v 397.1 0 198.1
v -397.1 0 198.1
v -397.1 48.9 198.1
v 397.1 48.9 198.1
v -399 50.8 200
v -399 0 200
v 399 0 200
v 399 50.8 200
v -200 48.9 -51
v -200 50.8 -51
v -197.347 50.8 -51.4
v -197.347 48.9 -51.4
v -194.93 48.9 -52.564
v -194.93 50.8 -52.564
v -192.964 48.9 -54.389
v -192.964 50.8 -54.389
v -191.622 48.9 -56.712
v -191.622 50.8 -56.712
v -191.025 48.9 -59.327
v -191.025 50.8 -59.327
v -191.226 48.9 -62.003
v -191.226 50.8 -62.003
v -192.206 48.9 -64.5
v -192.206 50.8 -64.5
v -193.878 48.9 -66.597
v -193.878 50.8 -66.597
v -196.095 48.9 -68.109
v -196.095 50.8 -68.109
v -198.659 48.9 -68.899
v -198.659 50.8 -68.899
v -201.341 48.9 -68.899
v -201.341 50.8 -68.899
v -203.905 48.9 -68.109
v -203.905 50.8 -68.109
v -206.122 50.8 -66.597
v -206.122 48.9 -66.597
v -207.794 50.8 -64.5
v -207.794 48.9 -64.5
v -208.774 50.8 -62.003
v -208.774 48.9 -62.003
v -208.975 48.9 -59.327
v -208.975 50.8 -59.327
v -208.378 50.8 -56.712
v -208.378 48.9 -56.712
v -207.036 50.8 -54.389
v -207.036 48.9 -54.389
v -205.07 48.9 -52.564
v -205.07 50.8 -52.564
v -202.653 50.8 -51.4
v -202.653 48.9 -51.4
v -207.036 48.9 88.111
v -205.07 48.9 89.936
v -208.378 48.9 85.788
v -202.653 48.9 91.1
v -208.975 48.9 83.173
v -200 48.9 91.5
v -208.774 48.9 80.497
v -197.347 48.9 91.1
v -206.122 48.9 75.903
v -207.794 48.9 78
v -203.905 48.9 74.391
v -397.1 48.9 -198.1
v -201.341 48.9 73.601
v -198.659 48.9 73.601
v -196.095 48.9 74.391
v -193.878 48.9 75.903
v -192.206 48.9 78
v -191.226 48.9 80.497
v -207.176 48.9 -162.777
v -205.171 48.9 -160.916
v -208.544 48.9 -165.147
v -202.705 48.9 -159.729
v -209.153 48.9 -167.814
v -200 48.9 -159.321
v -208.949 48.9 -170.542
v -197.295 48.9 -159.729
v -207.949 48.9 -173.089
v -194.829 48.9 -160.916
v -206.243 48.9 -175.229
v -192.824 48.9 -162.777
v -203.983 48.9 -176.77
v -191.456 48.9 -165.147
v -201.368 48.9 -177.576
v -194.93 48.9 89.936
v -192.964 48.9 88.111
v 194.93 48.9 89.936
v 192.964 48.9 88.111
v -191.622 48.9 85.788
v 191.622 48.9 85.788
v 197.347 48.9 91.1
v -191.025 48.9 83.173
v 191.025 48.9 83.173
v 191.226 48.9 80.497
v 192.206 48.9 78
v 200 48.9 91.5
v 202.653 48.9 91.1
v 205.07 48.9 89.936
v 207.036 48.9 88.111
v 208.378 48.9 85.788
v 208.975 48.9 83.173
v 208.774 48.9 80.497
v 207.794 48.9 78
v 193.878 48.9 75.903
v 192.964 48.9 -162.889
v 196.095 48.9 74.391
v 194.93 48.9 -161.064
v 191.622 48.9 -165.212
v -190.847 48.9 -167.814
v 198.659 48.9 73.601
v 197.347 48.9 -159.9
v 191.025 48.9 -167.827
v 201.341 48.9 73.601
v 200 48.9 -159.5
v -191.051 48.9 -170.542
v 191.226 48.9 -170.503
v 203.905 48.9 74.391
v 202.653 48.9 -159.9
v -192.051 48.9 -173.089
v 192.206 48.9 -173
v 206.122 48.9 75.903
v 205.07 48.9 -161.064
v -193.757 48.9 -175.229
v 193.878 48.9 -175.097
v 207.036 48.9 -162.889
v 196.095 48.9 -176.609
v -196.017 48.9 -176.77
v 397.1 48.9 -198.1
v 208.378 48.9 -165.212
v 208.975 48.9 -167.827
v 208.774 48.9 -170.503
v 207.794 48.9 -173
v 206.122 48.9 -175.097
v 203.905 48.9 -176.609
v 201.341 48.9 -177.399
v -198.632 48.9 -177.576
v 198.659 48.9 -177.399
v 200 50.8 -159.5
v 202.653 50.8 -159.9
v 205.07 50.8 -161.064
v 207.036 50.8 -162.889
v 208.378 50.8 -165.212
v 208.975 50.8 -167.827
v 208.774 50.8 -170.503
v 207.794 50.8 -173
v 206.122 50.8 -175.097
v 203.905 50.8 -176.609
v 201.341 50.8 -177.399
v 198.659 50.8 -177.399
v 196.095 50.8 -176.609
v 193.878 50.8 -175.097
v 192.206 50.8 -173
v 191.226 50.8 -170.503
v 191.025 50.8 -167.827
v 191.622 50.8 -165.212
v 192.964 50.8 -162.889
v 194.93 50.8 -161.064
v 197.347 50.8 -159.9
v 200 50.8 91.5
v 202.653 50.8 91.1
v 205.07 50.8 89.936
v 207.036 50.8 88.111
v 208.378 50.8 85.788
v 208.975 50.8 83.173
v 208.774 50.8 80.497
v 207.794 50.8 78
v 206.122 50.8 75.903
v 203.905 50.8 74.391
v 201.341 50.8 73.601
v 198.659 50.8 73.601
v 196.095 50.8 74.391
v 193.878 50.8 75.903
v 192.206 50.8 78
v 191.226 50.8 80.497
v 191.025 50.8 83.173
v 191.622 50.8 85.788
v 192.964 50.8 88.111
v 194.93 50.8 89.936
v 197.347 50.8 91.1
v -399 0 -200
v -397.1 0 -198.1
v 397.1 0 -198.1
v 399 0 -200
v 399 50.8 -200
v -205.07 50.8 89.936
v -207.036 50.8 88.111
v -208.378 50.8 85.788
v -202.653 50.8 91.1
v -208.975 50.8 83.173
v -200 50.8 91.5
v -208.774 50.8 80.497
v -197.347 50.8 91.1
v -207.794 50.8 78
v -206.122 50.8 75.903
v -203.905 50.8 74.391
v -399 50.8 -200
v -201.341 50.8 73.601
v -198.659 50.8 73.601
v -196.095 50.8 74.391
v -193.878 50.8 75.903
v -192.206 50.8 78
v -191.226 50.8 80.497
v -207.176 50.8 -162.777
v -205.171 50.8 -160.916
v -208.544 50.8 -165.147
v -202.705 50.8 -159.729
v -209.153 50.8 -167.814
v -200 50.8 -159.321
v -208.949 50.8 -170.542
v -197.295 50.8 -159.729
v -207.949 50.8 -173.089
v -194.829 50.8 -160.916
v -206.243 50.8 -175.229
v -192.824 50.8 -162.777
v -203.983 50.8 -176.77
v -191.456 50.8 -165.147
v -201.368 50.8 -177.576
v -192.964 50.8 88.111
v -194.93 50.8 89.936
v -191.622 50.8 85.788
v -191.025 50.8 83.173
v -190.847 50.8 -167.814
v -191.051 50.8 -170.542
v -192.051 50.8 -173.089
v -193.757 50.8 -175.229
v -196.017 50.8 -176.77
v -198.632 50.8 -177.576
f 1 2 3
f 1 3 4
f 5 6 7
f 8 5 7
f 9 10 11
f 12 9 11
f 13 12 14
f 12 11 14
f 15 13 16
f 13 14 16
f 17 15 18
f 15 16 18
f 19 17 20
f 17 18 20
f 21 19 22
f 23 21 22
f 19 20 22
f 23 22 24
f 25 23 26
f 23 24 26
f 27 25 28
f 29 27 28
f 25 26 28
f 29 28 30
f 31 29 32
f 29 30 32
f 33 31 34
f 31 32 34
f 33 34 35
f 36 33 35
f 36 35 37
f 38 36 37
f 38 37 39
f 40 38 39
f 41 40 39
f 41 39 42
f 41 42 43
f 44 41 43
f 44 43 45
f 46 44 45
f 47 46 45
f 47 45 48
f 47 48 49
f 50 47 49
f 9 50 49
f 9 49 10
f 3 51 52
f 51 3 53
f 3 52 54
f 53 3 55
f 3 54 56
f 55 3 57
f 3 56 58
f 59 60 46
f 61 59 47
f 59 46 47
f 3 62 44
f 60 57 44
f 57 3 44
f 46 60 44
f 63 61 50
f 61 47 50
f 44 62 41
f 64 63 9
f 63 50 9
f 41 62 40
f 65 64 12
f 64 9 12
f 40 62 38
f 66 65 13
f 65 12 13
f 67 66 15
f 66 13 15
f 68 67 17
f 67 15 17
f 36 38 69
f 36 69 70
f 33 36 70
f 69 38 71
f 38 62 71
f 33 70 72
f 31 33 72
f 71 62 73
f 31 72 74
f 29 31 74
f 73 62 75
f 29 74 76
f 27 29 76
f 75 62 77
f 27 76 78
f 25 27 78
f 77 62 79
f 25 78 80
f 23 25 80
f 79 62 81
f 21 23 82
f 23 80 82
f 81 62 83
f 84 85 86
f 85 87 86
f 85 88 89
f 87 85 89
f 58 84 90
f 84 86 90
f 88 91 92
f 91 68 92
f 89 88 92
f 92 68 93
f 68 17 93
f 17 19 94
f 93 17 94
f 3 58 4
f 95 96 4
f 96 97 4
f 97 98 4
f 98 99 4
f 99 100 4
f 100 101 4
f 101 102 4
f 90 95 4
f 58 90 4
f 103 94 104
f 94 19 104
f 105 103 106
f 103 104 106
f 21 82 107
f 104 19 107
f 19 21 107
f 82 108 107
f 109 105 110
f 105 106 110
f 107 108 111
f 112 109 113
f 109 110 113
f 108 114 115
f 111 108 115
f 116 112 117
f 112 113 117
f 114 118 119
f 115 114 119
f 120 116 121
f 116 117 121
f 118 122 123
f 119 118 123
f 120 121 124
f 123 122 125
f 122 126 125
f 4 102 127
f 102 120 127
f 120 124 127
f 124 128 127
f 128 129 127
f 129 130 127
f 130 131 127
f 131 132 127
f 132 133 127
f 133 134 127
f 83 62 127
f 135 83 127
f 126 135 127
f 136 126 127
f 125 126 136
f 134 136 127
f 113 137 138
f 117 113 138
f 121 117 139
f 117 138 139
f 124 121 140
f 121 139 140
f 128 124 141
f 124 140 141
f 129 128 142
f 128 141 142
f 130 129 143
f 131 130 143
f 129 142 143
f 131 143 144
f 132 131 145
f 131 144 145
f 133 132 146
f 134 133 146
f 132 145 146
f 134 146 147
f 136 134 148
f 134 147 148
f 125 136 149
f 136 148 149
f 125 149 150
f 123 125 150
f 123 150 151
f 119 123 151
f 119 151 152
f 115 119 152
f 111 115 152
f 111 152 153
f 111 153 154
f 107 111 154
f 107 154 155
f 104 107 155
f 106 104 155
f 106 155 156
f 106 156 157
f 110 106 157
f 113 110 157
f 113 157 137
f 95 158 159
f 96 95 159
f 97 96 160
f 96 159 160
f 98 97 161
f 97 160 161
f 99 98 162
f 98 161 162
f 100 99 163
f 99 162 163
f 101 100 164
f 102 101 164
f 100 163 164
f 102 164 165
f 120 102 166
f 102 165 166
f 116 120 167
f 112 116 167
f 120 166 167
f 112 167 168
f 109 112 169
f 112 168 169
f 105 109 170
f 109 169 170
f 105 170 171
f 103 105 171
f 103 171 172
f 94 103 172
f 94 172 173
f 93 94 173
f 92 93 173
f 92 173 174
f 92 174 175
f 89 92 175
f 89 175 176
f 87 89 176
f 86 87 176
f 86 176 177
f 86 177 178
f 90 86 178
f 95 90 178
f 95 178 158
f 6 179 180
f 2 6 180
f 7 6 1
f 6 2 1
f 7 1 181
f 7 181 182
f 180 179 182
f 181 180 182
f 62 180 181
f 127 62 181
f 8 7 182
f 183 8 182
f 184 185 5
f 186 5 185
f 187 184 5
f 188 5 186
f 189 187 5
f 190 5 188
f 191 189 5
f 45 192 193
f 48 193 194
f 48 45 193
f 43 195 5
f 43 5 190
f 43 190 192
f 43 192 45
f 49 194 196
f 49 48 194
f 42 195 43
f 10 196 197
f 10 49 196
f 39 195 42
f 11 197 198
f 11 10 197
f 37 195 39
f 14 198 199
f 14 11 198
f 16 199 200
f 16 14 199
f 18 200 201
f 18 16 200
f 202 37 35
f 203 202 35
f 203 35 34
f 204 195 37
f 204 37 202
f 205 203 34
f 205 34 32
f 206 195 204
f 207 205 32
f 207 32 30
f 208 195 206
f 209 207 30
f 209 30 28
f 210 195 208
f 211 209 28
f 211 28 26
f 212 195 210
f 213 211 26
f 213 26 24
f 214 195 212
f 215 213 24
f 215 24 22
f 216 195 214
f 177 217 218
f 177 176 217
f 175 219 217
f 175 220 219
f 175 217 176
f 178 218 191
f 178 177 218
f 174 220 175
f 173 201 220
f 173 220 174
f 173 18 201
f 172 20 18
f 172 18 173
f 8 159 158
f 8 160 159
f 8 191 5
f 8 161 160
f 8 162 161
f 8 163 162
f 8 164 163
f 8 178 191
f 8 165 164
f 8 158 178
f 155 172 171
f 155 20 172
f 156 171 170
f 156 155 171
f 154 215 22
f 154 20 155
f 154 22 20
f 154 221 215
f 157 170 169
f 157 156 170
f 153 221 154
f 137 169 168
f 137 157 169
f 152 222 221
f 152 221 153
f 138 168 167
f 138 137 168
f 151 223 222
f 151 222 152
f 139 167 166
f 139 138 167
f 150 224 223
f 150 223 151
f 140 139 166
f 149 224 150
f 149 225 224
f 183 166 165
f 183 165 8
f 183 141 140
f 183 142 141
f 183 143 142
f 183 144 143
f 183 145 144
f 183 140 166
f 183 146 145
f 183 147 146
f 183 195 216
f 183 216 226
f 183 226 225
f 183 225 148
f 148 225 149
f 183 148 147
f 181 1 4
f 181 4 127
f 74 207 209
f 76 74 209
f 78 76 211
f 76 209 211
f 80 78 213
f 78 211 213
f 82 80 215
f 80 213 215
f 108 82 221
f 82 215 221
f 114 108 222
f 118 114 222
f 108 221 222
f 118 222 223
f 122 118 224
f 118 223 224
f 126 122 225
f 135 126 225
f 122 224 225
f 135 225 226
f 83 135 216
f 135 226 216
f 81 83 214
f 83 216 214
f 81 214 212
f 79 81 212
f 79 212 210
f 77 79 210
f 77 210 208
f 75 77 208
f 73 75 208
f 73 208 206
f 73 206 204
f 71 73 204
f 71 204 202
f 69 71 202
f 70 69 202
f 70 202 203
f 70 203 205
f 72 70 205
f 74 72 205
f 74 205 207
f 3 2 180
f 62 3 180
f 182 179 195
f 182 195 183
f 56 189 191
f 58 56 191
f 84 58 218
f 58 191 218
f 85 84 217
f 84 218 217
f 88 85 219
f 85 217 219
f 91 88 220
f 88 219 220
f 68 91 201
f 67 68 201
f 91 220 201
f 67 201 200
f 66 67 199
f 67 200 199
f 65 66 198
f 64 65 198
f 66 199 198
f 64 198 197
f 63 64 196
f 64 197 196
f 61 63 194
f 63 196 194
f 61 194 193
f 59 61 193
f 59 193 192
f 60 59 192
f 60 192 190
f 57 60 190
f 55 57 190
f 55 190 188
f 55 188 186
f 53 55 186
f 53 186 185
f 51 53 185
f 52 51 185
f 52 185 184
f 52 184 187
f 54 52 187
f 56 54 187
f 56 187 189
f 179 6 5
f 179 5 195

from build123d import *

# Parameters (mm, degrees)
CROQUIS1_W              = 798
CROQUIS1_H              = 400
SALIENTE_EXTRUIR1_DEPTH = 50.8
VACIADO1_T              = -1.9
CROQUIS3_R              = 9
CROQUIS3_R_2            = 9.17877309
CORTAR_EXTRUIR1_DEPTH   = 10


with BuildPart() as part:
    # Croquis1 → Saliente-Extruir1 (new body)
    with BuildSketch(Plane(origin=(0, 0, 0), x_dir=(1, 0, 0), z_dir=(0, 1, 0))):
        Rectangle(CROQUIS1_W, CROQUIS1_H)
    extrude(amount=SALIENTE_EXTRUIR1_DEPTH)

    # Vaciado1
    vaciado1_openings = [part.faces().sort_by_distance(p)[0] for p in [
        (0, 0, 0),
    ]]
    offset(amount=VACIADO1_T, openings=vaciado1_openings, kind=Kind.INTERSECTION)

    # Croquis3 → Cortar-Extruir1 (cut)
    with BuildSketch(Plane(origin=(0, 50.8, 0), x_dir=(1, 0, 0), z_dir=(0, 1, 0))):
        with Locations(Location((200, -82.5, 0), (0, 0, 270))):
            Circle(CROQUIS3_R)
        with Locations(Location((200, 168.5, 0), (0, 0, 270))):
            Circle(CROQUIS3_R)
        with Locations(Location((-200, -82.5, 0), (0, 0, 270))):
            Circle(CROQUIS3_R)
        with Locations(Location((-200, 60, 0), (0, 0, 270))):
            Circle(CROQUIS3_R)
        with Locations(Location((-200, 168.5, 0), (0, 0, 270))):
            Circle(CROQUIS3_R_2)
    extrude(amount=-CORTAR_EXTRUIR1_DEPTH, mode=Mode.SUBTRACT)


solid = part.part
